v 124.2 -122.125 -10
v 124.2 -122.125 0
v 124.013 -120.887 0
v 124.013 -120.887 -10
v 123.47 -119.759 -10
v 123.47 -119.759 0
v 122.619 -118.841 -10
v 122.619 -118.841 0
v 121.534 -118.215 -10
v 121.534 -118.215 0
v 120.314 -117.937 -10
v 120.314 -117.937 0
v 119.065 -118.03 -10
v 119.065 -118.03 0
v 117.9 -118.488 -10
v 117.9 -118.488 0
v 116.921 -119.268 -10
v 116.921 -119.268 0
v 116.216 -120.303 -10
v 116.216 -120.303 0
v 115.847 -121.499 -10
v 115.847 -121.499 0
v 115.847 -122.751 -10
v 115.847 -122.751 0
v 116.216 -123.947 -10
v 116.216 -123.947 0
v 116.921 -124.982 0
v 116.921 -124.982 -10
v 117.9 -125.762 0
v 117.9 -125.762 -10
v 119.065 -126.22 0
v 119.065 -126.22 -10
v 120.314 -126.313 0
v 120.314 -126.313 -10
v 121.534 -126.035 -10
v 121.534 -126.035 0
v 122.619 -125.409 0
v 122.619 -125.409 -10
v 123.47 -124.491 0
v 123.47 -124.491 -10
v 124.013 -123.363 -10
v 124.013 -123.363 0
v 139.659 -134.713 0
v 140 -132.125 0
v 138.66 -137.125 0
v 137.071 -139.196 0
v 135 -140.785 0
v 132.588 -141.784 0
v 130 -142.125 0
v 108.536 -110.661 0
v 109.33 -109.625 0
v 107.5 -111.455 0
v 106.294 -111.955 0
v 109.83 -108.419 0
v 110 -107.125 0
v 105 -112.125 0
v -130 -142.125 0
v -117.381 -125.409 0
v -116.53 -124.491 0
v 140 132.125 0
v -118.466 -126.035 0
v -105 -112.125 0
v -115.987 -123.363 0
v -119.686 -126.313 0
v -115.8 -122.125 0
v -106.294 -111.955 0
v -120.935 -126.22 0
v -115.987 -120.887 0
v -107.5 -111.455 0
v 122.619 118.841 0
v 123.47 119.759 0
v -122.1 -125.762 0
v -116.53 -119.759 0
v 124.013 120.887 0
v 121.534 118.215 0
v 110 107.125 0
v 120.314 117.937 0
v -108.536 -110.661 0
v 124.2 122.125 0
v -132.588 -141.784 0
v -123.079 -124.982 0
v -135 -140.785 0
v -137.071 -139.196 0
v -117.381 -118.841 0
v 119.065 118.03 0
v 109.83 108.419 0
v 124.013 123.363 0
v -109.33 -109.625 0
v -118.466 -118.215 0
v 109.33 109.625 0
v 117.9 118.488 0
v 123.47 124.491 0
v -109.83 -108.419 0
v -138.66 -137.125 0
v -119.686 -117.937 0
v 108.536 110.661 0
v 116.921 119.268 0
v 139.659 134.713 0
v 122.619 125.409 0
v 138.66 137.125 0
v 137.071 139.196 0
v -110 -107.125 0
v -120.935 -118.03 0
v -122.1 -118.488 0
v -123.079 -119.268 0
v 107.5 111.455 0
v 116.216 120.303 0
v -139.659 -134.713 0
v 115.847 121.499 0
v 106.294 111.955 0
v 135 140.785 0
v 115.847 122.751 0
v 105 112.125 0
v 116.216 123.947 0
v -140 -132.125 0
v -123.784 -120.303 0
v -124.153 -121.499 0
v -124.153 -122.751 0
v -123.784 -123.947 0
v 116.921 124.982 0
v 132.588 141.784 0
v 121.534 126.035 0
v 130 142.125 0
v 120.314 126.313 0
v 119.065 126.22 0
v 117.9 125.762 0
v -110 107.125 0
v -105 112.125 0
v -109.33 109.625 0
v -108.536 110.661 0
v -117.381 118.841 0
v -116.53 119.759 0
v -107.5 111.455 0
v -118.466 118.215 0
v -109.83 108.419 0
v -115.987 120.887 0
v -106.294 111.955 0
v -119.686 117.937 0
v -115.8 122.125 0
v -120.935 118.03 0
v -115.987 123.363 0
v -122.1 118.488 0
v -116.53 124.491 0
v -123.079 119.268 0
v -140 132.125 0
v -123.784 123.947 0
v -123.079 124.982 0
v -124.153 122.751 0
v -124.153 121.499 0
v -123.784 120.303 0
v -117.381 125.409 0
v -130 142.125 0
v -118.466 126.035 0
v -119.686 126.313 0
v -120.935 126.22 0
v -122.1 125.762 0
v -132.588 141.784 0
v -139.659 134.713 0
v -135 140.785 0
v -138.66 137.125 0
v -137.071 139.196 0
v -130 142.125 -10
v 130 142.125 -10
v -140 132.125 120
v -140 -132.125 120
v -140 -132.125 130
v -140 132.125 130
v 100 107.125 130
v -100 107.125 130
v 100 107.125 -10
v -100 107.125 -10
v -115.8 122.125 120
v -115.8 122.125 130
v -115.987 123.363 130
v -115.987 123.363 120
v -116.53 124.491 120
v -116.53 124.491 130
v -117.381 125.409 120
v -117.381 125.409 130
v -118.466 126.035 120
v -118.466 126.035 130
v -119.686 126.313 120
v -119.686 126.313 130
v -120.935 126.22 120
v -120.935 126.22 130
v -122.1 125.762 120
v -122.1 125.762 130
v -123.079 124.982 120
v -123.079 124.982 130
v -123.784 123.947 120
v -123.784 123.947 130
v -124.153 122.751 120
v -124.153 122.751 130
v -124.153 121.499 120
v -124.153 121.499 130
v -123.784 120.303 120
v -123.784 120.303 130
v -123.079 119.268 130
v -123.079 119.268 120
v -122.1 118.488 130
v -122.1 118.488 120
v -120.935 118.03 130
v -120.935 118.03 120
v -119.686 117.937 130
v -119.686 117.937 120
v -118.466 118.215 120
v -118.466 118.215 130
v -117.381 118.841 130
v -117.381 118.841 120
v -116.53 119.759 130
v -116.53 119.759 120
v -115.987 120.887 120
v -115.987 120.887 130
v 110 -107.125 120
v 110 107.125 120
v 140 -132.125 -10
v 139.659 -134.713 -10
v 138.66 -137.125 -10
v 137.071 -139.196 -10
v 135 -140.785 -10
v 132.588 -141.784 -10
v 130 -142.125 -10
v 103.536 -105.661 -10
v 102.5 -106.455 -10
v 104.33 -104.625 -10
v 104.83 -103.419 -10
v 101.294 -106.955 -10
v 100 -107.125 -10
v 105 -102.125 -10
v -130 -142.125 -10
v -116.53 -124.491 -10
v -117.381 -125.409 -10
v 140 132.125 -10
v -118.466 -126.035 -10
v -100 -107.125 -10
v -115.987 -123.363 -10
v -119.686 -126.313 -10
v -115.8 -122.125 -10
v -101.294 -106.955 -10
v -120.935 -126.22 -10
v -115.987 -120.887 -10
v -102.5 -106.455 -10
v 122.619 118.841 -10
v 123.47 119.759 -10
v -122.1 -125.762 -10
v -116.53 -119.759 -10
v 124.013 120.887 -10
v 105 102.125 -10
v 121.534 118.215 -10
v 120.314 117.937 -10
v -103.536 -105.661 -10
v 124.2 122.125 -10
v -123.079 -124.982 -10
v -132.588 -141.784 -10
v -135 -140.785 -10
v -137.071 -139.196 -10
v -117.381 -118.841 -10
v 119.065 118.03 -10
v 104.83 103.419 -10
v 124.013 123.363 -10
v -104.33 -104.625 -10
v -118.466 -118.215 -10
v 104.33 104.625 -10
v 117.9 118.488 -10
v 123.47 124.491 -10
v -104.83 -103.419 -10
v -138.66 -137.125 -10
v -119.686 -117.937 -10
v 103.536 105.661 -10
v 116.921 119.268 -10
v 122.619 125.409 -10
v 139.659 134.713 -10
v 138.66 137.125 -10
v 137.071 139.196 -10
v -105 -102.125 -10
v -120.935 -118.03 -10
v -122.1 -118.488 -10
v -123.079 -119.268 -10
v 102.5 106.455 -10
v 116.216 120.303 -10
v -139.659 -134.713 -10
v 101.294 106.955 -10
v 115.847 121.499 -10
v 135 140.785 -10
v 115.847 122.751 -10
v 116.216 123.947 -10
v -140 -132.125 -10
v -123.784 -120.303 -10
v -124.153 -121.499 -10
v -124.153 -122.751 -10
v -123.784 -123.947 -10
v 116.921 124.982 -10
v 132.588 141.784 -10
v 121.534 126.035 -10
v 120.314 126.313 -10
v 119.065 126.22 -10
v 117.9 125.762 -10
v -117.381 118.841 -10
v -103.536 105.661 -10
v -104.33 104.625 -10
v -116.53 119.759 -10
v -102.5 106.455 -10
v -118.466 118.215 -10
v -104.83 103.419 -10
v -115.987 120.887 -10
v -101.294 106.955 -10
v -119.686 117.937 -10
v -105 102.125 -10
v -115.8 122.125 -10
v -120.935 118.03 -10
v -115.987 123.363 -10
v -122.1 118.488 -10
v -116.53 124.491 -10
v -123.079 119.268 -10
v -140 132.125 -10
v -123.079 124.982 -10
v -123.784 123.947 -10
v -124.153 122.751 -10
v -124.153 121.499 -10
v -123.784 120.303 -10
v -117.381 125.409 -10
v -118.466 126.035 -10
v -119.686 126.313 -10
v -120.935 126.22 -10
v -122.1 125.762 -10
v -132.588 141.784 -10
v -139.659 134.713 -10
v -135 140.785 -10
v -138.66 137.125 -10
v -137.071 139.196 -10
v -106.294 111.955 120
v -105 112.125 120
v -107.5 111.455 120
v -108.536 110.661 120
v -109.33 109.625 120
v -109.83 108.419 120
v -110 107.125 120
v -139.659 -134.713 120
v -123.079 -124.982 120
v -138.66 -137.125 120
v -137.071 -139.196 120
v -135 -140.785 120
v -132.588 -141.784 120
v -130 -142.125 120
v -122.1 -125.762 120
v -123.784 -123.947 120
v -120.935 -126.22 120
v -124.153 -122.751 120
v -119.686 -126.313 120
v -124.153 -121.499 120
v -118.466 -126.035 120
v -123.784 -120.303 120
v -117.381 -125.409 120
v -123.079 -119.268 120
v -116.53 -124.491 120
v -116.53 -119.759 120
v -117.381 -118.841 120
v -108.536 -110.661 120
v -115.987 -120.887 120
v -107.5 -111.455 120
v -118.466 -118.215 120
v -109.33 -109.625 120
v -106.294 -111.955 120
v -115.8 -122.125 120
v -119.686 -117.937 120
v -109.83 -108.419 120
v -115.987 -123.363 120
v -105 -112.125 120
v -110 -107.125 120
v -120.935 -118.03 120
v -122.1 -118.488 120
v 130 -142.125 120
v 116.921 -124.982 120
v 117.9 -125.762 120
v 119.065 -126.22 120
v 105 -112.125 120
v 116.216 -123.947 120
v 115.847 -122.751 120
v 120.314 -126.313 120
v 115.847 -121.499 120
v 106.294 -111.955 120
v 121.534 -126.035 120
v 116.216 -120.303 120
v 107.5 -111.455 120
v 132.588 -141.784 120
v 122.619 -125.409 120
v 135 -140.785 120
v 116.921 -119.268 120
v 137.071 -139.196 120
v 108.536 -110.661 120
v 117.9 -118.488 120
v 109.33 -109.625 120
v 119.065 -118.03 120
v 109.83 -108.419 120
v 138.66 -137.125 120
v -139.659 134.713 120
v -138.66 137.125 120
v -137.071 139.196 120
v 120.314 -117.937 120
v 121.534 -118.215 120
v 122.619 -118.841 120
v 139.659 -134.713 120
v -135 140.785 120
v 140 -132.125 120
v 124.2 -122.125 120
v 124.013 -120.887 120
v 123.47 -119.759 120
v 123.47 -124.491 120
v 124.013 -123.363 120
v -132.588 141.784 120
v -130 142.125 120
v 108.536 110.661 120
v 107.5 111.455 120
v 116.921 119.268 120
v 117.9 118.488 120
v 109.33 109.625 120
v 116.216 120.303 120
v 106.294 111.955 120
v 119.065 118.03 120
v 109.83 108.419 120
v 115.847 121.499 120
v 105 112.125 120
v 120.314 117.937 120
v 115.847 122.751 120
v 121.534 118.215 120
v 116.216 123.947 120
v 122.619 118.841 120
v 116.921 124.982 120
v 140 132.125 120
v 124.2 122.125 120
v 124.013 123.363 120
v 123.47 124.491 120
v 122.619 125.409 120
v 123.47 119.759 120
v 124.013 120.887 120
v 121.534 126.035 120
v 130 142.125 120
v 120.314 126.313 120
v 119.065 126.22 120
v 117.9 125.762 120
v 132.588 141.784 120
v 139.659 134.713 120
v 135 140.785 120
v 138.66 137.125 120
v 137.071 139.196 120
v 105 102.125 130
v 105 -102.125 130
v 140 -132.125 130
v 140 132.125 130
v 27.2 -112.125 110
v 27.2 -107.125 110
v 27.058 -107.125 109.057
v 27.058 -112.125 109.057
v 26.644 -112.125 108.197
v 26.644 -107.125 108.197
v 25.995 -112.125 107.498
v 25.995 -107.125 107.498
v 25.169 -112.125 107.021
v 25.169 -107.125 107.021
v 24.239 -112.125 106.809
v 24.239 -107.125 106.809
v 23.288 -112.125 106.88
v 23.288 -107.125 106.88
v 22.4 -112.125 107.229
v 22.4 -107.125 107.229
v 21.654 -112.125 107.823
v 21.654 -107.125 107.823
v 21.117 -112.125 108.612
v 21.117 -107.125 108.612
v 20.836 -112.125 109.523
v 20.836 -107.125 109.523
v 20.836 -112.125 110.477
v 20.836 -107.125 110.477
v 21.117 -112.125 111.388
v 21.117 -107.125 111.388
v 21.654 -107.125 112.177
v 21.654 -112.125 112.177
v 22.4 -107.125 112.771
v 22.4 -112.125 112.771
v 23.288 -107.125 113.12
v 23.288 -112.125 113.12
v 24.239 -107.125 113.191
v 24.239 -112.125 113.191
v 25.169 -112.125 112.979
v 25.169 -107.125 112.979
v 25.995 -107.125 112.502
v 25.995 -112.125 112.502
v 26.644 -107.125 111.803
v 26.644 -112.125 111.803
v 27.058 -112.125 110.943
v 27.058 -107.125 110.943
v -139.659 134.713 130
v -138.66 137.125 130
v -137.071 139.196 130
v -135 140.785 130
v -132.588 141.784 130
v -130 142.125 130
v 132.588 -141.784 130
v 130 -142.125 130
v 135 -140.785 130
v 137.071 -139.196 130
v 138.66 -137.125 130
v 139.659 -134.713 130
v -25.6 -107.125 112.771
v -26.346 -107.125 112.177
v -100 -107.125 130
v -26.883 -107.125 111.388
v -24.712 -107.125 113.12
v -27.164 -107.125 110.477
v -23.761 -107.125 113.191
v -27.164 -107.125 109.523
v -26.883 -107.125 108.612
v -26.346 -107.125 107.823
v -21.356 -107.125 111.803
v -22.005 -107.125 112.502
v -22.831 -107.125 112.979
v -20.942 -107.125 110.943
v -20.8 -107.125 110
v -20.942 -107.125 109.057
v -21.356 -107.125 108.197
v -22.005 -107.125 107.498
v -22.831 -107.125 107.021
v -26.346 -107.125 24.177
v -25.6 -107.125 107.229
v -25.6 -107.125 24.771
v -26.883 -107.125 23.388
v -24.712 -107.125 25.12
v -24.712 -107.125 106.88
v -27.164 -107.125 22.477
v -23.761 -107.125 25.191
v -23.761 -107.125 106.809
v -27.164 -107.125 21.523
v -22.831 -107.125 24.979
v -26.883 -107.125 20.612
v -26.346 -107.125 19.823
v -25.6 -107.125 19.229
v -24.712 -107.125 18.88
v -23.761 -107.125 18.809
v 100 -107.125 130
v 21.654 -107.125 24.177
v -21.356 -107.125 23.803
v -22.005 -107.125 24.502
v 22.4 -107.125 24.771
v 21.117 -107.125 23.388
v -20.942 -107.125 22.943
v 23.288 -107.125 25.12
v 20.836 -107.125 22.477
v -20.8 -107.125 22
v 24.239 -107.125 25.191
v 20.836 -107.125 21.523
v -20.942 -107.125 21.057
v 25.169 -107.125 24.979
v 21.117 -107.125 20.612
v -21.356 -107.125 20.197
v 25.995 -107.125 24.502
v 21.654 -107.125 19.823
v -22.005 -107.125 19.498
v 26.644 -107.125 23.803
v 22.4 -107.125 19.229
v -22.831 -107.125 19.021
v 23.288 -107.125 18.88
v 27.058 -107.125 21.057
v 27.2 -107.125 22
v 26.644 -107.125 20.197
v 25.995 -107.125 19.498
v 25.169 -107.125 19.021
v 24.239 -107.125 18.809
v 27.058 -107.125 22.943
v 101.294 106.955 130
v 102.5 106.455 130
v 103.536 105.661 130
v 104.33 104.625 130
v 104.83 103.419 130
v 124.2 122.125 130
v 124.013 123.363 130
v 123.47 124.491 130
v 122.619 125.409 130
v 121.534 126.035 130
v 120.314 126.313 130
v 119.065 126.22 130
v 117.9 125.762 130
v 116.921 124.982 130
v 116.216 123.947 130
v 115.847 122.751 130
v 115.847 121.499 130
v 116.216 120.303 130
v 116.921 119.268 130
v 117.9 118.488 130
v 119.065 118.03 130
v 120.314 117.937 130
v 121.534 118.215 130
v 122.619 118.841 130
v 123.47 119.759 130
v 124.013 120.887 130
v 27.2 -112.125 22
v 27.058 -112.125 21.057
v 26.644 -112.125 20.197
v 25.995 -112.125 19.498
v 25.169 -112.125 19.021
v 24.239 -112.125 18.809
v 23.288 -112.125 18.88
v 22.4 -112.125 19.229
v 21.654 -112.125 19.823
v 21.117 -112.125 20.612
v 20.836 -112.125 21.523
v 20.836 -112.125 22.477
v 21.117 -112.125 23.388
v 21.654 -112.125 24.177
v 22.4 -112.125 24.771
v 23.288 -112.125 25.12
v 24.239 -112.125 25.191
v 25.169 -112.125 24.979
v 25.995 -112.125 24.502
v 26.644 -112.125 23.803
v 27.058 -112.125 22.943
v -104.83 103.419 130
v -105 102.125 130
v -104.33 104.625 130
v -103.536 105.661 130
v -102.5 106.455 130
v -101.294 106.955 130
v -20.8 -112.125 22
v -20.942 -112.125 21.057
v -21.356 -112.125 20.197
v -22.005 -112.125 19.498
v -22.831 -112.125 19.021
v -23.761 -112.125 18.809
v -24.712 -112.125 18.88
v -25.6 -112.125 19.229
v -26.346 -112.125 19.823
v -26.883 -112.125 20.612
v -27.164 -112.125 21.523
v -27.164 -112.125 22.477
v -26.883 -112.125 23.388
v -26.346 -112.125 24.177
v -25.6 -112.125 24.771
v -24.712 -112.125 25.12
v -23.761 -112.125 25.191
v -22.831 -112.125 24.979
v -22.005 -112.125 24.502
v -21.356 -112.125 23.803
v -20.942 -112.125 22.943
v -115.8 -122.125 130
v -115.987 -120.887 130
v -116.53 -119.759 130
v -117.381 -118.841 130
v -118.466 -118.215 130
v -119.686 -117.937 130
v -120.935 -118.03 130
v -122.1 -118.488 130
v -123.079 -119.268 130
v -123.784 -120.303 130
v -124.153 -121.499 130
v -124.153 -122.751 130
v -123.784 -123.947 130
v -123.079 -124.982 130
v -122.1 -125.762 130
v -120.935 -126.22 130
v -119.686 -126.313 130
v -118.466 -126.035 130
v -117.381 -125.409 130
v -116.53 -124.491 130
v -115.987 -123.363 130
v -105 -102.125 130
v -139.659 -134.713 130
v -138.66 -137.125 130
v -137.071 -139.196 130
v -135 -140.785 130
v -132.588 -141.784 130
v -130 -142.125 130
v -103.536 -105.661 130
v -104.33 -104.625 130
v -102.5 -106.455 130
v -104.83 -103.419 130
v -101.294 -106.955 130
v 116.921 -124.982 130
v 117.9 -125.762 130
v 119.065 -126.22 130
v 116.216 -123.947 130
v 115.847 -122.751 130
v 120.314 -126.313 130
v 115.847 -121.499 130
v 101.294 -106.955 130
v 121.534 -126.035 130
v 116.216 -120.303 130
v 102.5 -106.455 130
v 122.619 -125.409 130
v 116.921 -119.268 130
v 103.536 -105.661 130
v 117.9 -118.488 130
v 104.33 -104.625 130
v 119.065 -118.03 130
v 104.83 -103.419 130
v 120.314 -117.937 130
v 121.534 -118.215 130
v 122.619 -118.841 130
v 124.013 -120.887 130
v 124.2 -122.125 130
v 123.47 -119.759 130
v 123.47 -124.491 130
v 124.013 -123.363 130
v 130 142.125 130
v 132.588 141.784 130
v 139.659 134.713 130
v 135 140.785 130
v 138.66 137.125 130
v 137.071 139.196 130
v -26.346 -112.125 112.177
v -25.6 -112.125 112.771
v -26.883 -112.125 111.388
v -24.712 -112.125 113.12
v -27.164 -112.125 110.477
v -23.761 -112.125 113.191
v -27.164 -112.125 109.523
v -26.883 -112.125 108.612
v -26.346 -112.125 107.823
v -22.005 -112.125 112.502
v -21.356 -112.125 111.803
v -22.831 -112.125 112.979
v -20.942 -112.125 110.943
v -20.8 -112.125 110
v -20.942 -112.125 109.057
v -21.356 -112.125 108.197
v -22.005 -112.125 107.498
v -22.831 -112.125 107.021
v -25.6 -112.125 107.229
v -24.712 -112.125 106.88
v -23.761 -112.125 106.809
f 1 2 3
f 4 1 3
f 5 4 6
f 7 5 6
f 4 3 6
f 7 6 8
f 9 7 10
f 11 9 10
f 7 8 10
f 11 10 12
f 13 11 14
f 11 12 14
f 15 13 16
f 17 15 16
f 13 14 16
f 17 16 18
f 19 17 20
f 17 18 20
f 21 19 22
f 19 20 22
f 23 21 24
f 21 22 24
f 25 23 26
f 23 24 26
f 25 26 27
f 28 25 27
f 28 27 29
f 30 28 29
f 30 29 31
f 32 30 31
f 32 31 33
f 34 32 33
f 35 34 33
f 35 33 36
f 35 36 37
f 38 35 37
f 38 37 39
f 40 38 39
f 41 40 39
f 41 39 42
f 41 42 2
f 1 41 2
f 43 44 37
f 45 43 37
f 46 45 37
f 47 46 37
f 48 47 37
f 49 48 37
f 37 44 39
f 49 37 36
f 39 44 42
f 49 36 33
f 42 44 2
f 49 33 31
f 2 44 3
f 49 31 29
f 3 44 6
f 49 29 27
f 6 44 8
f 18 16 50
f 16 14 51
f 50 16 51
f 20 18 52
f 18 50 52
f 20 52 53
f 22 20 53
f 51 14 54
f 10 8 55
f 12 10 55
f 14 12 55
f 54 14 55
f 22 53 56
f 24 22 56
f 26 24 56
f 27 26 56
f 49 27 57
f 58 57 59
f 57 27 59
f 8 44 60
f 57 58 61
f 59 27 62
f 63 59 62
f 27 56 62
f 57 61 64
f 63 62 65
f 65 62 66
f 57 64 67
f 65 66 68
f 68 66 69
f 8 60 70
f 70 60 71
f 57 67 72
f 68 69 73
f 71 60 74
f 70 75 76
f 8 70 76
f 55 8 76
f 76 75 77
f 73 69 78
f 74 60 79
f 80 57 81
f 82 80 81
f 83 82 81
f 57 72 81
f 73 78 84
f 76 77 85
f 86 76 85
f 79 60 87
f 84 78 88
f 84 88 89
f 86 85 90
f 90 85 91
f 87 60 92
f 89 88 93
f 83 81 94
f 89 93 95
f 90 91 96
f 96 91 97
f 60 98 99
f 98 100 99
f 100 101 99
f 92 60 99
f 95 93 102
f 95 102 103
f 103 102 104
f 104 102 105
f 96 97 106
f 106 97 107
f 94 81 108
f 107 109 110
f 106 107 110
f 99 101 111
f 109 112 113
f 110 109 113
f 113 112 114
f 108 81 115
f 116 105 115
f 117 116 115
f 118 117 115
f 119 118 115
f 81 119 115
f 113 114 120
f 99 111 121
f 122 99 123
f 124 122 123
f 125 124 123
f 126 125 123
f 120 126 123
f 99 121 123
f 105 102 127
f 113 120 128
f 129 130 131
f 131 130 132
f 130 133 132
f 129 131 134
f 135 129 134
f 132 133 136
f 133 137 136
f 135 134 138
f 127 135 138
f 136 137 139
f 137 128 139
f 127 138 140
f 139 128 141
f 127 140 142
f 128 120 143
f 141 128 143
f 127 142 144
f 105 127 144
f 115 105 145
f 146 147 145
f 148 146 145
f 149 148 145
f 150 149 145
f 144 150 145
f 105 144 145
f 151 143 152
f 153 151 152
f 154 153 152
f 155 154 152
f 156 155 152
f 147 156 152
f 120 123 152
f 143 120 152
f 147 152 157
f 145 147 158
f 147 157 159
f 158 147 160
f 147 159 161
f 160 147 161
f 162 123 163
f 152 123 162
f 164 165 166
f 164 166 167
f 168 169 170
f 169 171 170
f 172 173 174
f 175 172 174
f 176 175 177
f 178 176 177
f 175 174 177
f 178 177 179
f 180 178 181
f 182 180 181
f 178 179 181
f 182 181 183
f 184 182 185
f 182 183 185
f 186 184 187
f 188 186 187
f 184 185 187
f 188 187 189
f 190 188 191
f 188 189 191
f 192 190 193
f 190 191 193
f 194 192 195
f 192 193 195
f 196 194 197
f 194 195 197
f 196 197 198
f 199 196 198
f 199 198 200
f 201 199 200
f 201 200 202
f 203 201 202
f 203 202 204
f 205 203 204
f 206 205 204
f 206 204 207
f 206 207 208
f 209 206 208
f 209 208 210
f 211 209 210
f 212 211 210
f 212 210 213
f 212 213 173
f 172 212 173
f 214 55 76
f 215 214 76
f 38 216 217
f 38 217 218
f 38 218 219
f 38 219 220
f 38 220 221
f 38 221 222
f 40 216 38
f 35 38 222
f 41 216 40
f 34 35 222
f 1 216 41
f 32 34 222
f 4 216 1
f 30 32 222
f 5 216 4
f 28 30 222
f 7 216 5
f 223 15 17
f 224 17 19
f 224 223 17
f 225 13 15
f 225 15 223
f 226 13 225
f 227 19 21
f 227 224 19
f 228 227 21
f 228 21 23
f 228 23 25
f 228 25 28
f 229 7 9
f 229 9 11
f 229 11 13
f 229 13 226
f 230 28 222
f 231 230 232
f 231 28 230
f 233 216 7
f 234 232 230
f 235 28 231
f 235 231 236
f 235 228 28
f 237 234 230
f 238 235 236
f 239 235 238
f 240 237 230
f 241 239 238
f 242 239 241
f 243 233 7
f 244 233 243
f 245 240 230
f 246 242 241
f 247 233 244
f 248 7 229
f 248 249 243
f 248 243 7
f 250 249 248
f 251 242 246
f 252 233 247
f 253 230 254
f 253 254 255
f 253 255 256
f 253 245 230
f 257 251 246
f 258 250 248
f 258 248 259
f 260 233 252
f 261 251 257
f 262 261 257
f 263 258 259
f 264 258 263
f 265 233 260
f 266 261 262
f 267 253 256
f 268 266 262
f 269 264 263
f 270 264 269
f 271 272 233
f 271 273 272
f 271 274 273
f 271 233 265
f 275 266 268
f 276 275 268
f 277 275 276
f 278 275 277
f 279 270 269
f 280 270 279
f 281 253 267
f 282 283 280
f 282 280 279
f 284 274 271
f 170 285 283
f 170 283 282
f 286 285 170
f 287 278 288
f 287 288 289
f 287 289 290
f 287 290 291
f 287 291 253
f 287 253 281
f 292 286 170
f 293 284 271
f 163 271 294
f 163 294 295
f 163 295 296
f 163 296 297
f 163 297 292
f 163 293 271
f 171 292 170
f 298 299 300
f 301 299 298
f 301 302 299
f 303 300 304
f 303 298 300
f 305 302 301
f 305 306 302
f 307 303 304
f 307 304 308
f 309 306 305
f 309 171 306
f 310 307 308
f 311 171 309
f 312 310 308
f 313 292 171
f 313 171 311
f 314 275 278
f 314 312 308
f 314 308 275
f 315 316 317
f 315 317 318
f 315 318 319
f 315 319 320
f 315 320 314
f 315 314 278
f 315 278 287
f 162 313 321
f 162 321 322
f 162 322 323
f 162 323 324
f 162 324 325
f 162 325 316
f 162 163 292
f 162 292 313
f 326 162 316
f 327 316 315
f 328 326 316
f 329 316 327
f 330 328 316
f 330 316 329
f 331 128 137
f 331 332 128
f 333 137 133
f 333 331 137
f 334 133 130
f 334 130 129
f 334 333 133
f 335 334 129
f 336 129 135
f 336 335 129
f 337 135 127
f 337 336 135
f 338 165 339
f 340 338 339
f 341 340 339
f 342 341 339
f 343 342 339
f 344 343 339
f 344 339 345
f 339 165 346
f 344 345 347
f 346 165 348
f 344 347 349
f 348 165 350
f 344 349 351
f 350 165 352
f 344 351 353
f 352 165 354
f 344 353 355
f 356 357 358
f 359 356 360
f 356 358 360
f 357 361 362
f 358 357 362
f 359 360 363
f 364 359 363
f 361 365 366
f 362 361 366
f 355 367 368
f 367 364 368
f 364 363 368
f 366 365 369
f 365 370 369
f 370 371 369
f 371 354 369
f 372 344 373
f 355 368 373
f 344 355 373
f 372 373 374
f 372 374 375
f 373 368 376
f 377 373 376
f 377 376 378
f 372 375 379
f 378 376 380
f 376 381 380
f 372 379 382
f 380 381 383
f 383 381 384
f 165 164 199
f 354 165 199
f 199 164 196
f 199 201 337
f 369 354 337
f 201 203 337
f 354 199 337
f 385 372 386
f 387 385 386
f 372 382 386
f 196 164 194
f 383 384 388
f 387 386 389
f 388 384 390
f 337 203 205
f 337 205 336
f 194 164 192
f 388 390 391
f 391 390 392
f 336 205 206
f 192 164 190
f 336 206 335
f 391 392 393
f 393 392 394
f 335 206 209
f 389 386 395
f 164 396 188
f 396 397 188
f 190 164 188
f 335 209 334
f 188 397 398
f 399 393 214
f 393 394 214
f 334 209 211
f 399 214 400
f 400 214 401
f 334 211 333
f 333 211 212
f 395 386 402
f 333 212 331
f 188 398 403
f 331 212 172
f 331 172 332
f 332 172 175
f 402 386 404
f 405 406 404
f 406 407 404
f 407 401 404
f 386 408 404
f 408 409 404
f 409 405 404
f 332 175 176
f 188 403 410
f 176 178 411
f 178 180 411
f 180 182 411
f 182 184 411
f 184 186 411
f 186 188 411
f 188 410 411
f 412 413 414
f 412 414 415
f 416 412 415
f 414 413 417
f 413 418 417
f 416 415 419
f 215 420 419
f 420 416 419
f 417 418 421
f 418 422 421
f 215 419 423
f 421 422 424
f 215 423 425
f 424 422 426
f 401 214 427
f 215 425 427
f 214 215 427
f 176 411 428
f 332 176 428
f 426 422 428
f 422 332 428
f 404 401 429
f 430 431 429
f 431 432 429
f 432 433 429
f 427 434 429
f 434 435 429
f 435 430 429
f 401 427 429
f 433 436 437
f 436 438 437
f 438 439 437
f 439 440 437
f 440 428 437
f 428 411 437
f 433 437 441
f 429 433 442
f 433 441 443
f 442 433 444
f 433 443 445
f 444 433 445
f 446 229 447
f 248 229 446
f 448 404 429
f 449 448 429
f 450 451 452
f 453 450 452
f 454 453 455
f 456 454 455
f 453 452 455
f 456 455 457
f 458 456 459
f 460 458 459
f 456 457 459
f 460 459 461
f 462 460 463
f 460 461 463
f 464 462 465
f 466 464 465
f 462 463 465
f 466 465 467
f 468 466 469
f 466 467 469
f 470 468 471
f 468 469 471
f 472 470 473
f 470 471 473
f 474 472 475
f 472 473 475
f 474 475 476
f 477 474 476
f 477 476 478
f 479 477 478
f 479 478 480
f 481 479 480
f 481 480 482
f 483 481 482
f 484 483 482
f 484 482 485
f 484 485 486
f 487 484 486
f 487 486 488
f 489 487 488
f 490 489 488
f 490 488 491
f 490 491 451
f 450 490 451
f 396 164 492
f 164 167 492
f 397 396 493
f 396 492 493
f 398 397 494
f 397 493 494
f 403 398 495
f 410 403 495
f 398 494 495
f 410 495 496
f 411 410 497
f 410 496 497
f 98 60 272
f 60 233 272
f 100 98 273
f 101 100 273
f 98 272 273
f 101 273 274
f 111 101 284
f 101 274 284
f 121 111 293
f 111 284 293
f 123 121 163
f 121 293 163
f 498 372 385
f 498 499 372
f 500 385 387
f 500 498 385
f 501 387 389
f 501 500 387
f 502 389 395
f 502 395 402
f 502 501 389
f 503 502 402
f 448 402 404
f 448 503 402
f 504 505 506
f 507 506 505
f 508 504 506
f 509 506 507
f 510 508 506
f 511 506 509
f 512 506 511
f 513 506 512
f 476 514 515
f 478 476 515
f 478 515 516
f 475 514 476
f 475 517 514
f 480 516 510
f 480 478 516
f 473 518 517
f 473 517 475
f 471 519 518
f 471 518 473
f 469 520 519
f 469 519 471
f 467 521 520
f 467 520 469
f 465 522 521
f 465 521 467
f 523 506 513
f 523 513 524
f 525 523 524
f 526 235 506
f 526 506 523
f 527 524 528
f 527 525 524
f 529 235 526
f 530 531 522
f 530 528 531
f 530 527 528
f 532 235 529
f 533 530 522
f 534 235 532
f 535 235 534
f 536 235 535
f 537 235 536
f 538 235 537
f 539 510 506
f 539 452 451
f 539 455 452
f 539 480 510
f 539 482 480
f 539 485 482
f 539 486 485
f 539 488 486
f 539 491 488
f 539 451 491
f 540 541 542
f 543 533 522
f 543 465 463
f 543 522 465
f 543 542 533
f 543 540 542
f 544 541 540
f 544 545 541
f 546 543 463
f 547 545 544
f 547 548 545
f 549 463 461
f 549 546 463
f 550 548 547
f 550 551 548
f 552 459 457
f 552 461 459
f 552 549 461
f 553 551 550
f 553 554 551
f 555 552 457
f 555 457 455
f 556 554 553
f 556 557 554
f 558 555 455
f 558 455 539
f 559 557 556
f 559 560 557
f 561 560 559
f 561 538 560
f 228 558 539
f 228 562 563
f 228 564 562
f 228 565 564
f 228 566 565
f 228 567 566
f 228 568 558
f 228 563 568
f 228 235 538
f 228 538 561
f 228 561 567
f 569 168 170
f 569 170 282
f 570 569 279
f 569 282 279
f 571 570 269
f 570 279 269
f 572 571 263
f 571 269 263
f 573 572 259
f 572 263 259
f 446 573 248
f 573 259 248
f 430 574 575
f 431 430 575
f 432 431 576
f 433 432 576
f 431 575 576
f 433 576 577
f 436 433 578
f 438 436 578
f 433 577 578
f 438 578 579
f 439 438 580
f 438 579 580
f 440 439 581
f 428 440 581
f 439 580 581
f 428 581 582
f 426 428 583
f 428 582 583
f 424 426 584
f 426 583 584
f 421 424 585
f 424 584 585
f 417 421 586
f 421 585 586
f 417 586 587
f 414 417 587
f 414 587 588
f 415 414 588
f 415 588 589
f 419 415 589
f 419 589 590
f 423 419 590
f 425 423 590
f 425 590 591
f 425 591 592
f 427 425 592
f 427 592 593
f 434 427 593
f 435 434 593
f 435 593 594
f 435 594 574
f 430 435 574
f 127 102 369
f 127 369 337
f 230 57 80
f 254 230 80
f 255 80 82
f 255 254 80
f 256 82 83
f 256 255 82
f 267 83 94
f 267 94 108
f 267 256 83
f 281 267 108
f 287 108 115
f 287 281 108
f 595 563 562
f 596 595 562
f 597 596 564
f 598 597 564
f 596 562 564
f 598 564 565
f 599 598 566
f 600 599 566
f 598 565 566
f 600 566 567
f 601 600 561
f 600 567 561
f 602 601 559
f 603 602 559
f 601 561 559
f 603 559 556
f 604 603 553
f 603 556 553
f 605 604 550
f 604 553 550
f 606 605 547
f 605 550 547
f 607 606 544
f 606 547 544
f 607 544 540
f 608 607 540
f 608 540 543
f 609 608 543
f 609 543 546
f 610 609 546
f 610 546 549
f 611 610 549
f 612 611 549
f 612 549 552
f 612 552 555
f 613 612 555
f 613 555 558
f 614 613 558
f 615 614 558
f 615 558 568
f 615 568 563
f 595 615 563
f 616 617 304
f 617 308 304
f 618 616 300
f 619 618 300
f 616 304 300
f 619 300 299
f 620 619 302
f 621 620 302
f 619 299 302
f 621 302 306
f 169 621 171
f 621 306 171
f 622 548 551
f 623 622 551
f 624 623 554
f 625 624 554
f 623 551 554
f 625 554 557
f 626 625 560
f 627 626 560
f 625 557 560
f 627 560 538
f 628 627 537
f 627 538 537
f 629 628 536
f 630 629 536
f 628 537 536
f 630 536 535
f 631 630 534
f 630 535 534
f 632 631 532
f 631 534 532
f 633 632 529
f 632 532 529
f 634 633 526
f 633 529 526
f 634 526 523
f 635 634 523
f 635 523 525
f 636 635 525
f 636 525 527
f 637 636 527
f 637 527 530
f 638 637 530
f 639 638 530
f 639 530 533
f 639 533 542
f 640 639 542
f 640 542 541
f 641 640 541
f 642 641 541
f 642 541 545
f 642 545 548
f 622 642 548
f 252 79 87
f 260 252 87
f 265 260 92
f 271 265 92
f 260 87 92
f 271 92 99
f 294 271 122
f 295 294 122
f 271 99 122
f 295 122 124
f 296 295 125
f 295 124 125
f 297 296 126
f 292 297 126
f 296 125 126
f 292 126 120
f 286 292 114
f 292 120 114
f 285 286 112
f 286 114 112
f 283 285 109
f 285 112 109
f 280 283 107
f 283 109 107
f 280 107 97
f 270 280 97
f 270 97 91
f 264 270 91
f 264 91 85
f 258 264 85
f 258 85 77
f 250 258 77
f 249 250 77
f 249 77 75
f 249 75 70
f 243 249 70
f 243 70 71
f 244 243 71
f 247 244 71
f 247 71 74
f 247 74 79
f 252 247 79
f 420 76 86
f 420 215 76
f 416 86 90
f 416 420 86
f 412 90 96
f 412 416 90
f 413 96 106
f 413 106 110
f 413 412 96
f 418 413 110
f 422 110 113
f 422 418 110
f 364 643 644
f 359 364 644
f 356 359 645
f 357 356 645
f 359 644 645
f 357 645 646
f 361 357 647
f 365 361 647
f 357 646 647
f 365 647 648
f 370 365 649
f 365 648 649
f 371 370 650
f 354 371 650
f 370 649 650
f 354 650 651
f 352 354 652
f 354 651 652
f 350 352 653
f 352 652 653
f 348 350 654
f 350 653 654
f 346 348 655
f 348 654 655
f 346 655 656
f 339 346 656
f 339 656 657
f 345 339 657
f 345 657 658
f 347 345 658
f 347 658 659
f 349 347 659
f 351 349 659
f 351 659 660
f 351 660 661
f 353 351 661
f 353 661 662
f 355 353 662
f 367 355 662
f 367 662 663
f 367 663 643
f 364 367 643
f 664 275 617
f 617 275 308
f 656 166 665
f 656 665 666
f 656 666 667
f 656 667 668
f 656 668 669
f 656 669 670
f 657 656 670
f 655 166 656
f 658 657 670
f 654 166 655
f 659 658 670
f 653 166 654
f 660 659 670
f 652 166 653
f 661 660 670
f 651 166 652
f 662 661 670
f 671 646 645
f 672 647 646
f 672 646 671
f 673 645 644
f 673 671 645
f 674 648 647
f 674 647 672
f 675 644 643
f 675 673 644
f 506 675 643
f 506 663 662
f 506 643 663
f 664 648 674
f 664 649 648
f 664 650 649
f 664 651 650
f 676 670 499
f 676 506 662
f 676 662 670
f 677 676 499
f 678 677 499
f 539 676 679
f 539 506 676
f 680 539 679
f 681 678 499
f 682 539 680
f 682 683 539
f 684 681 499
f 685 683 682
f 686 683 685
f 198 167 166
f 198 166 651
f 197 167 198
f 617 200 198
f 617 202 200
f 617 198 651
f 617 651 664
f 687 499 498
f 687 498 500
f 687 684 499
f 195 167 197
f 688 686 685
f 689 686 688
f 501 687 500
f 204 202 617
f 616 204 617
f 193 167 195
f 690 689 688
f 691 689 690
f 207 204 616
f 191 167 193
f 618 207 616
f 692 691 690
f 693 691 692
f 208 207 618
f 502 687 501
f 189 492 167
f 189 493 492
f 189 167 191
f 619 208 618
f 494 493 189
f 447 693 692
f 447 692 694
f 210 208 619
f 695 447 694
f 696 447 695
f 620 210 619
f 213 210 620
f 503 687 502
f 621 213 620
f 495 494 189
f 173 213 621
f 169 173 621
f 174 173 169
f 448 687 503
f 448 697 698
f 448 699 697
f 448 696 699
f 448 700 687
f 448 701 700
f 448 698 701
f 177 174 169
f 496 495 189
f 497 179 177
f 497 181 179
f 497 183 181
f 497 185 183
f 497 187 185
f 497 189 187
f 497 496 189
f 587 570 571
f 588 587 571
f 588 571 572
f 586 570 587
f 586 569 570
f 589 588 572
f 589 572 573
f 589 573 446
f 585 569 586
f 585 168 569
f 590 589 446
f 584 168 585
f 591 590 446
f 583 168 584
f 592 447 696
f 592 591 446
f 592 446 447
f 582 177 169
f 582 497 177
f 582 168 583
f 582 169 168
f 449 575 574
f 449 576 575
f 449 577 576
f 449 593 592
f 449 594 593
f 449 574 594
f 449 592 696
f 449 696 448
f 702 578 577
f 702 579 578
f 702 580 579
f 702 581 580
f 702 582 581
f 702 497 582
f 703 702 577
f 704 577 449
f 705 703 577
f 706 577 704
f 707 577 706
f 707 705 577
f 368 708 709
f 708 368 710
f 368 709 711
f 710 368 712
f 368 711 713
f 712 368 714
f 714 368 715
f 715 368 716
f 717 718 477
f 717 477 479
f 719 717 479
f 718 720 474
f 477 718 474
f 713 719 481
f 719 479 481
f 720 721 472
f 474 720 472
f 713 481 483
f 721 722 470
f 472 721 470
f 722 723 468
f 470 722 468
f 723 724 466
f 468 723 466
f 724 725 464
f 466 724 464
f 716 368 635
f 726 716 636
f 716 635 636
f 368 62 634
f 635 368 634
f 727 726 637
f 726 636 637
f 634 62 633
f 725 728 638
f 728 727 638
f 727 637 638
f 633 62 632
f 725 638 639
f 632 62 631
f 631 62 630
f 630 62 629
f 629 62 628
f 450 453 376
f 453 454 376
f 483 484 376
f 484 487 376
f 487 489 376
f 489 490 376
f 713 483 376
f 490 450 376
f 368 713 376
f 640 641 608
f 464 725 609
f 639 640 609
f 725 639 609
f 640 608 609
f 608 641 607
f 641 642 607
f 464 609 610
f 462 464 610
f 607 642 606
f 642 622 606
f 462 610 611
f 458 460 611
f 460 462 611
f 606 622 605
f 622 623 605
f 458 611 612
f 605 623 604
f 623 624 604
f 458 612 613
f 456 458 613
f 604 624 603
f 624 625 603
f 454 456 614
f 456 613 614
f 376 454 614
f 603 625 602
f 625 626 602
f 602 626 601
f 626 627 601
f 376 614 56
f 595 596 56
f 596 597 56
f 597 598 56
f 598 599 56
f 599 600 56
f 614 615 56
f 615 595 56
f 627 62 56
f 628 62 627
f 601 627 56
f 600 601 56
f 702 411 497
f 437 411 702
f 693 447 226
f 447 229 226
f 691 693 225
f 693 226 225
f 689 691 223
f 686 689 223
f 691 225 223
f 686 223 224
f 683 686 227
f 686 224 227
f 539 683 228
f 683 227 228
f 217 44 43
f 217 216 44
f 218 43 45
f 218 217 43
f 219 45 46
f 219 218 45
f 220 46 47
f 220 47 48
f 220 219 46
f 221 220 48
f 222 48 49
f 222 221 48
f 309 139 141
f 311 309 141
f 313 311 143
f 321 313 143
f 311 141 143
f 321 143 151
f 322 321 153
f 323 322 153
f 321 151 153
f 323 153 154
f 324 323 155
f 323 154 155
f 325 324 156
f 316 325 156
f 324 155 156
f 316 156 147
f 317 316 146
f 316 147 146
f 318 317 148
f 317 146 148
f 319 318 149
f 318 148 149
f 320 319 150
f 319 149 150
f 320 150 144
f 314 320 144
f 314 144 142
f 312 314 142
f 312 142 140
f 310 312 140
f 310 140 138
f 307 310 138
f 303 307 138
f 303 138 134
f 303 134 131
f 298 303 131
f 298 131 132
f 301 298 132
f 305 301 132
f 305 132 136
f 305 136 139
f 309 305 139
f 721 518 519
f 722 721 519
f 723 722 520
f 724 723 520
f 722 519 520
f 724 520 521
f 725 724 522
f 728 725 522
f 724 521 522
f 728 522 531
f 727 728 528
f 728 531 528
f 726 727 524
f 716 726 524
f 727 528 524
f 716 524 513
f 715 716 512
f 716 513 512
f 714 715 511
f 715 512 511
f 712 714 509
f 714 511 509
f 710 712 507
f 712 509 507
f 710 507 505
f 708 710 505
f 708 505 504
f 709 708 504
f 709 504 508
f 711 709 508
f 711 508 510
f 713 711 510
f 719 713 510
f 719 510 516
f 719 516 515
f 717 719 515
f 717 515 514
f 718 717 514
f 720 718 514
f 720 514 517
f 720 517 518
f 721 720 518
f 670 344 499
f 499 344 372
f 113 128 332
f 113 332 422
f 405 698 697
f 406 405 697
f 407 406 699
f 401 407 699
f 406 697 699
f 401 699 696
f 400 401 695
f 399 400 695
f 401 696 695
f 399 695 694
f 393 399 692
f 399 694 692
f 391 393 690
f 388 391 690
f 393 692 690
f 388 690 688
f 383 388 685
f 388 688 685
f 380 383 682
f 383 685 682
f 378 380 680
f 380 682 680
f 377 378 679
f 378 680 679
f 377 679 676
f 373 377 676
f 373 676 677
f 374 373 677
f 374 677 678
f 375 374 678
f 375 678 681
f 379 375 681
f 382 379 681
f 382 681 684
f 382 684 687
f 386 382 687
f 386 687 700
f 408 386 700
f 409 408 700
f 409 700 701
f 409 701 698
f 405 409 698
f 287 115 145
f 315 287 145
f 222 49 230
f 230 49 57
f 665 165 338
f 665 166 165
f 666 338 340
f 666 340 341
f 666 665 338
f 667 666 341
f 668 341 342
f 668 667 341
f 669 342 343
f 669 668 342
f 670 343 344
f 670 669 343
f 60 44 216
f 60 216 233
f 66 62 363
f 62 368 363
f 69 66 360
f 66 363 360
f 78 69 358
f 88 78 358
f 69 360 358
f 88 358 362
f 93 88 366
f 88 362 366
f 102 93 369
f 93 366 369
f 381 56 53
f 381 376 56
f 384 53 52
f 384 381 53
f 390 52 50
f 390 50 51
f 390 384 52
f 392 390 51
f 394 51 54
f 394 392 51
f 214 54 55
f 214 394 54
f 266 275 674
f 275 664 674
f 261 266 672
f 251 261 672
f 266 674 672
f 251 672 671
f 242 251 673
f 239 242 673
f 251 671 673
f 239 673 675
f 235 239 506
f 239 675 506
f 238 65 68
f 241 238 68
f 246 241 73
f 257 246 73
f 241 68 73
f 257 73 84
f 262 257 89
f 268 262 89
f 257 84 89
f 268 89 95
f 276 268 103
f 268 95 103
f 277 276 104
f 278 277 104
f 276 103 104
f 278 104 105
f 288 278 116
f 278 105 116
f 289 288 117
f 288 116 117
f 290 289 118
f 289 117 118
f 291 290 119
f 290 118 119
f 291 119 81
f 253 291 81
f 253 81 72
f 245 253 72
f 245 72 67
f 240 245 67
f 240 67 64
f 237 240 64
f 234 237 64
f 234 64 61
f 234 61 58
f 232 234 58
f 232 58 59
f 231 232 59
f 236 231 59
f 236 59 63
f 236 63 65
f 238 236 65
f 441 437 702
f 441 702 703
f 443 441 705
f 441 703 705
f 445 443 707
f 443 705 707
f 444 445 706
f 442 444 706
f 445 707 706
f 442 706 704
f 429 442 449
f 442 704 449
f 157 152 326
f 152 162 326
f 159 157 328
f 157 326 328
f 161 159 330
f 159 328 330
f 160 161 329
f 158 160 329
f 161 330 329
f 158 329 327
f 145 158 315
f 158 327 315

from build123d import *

# Parameters (mm, degrees)
SKETCH_4_W                  = 220
SKETCH_4_H                  = 224.25
SKETCH_4_W_2                = 210
SKETCH_4_H_2                = 214.25
EXTRUDE_7_DEPTH             = 120
SKETCH_7_W                  = 280
SKETCH_7_H                  = 284.25
SKETCH_7_W_2                = 210
SKETCH_7_H_2                = 214.25
EXTRUDE_8_DEPTH             = 10
SKETCH_8_W                  = 280
SKETCH_8_H                  = 284.25
SKETCH_8_W_2                = 210
SKETCH_8_H_2                = 214.25
EXTRUDE_9_DEPTH             = 10
FILLET_5_R                  = 5
FILLET_6_R                  = 10
HOLE_WIZARD_8_4_8_4_1_D     = 8.4
HOLE_WIZARD_6_4_6_4_1_D     = 6.4
HOLE_WIZARD_6_4_6_4_1_DEPTH = 5


with BuildPart() as part:
    # 草图4 → 凸台-拉伸7 (new body)
    with BuildSketch(Plane.XY):
        Rectangle(SKETCH_4_W, SKETCH_4_H)
        Rectangle(SKETCH_4_W_2, SKETCH_4_H_2, mode=Mode.SUBTRACT)
    extrude(amount=EXTRUDE_7_DEPTH)

    # 草图7 → 凸台-拉伸8 (add)
    with BuildSketch(Plane(origin=(0, 0, 0), x_dir=(-1, 0, 0), z_dir=(0, 0, -1))):
        Rectangle(SKETCH_7_W, SKETCH_7_H)
        Rectangle(SKETCH_7_W_2, SKETCH_7_H_2, mode=Mode.SUBTRACT)
    extrude(amount=EXTRUDE_8_DEPTH)

    # 草图8 → 凸台-拉伸9 (add)
    with BuildSketch(Plane.XY.offset(120)):
        Rectangle(SKETCH_8_W, SKETCH_8_H)
        Rectangle(SKETCH_8_W_2, SKETCH_8_H_2, mode=Mode.SUBTRACT)
    extrude(amount=EXTRUDE_9_DEPTH)

    # 圆角5
    fillet_5_edges = [part.edges().sort_by_distance(p)[0] for p in [
        (105, -107.125, 60),
        (105, 107.125, 60),
        (-105, 107.125, 60),
        (-105, -107.125, 60),
        (110, -112.125, 60),
        (-110, -112.125, 60),
        (-110, 112.125, 60),
        (110, 112.125, 60),
    ]]
    fillet(fillet_5_edges, radius=FILLET_5_R)

    # 圆角6
    fillet_6_edges = [part.edges().sort_by_distance(p)[0] for p in [
        (140, 142.125, -5),
        (140, -142.125, -5),
        (-140, -142.125, -5),
        (-140, 142.125, -5),
        (-140, 142.125, 125),
        (-140, -142.125, 125),
        (140, -142.125, 125),
        (140, 142.125, 125),
    ]]
    fillet(fillet_6_edges, radius=FILLET_6_R)

    # Ø8.4 (8.4) 直径孔1 (through all)
    with Locations(Plane(origin=(0, 0, -10), x_dir=(-1, 0, 0), z_dir=(0, 0, -1))):
        with Locations((120, -122.125), (120, 122.125), (-120, 122.125), (-120, -122.125)):
            Hole(HOLE_WIZARD_8_4_8_4_1_D / 2)

    # Ø6.4 (6.4) 直径孔1
    with Locations(Plane(origin=(0, -112.125, 0), x_dir=(-1, 0, 0), z_dir=(0, -1, 0))):
        with Locations((24, -110), (-24, -110), (-24, -22), (24, -22)):
            Hole(HOLE_WIZARD_6_4_6_4_1_D / 2, depth=HOLE_WIZARD_6_4_6_4_1_DEPTH)


solid = part.part
